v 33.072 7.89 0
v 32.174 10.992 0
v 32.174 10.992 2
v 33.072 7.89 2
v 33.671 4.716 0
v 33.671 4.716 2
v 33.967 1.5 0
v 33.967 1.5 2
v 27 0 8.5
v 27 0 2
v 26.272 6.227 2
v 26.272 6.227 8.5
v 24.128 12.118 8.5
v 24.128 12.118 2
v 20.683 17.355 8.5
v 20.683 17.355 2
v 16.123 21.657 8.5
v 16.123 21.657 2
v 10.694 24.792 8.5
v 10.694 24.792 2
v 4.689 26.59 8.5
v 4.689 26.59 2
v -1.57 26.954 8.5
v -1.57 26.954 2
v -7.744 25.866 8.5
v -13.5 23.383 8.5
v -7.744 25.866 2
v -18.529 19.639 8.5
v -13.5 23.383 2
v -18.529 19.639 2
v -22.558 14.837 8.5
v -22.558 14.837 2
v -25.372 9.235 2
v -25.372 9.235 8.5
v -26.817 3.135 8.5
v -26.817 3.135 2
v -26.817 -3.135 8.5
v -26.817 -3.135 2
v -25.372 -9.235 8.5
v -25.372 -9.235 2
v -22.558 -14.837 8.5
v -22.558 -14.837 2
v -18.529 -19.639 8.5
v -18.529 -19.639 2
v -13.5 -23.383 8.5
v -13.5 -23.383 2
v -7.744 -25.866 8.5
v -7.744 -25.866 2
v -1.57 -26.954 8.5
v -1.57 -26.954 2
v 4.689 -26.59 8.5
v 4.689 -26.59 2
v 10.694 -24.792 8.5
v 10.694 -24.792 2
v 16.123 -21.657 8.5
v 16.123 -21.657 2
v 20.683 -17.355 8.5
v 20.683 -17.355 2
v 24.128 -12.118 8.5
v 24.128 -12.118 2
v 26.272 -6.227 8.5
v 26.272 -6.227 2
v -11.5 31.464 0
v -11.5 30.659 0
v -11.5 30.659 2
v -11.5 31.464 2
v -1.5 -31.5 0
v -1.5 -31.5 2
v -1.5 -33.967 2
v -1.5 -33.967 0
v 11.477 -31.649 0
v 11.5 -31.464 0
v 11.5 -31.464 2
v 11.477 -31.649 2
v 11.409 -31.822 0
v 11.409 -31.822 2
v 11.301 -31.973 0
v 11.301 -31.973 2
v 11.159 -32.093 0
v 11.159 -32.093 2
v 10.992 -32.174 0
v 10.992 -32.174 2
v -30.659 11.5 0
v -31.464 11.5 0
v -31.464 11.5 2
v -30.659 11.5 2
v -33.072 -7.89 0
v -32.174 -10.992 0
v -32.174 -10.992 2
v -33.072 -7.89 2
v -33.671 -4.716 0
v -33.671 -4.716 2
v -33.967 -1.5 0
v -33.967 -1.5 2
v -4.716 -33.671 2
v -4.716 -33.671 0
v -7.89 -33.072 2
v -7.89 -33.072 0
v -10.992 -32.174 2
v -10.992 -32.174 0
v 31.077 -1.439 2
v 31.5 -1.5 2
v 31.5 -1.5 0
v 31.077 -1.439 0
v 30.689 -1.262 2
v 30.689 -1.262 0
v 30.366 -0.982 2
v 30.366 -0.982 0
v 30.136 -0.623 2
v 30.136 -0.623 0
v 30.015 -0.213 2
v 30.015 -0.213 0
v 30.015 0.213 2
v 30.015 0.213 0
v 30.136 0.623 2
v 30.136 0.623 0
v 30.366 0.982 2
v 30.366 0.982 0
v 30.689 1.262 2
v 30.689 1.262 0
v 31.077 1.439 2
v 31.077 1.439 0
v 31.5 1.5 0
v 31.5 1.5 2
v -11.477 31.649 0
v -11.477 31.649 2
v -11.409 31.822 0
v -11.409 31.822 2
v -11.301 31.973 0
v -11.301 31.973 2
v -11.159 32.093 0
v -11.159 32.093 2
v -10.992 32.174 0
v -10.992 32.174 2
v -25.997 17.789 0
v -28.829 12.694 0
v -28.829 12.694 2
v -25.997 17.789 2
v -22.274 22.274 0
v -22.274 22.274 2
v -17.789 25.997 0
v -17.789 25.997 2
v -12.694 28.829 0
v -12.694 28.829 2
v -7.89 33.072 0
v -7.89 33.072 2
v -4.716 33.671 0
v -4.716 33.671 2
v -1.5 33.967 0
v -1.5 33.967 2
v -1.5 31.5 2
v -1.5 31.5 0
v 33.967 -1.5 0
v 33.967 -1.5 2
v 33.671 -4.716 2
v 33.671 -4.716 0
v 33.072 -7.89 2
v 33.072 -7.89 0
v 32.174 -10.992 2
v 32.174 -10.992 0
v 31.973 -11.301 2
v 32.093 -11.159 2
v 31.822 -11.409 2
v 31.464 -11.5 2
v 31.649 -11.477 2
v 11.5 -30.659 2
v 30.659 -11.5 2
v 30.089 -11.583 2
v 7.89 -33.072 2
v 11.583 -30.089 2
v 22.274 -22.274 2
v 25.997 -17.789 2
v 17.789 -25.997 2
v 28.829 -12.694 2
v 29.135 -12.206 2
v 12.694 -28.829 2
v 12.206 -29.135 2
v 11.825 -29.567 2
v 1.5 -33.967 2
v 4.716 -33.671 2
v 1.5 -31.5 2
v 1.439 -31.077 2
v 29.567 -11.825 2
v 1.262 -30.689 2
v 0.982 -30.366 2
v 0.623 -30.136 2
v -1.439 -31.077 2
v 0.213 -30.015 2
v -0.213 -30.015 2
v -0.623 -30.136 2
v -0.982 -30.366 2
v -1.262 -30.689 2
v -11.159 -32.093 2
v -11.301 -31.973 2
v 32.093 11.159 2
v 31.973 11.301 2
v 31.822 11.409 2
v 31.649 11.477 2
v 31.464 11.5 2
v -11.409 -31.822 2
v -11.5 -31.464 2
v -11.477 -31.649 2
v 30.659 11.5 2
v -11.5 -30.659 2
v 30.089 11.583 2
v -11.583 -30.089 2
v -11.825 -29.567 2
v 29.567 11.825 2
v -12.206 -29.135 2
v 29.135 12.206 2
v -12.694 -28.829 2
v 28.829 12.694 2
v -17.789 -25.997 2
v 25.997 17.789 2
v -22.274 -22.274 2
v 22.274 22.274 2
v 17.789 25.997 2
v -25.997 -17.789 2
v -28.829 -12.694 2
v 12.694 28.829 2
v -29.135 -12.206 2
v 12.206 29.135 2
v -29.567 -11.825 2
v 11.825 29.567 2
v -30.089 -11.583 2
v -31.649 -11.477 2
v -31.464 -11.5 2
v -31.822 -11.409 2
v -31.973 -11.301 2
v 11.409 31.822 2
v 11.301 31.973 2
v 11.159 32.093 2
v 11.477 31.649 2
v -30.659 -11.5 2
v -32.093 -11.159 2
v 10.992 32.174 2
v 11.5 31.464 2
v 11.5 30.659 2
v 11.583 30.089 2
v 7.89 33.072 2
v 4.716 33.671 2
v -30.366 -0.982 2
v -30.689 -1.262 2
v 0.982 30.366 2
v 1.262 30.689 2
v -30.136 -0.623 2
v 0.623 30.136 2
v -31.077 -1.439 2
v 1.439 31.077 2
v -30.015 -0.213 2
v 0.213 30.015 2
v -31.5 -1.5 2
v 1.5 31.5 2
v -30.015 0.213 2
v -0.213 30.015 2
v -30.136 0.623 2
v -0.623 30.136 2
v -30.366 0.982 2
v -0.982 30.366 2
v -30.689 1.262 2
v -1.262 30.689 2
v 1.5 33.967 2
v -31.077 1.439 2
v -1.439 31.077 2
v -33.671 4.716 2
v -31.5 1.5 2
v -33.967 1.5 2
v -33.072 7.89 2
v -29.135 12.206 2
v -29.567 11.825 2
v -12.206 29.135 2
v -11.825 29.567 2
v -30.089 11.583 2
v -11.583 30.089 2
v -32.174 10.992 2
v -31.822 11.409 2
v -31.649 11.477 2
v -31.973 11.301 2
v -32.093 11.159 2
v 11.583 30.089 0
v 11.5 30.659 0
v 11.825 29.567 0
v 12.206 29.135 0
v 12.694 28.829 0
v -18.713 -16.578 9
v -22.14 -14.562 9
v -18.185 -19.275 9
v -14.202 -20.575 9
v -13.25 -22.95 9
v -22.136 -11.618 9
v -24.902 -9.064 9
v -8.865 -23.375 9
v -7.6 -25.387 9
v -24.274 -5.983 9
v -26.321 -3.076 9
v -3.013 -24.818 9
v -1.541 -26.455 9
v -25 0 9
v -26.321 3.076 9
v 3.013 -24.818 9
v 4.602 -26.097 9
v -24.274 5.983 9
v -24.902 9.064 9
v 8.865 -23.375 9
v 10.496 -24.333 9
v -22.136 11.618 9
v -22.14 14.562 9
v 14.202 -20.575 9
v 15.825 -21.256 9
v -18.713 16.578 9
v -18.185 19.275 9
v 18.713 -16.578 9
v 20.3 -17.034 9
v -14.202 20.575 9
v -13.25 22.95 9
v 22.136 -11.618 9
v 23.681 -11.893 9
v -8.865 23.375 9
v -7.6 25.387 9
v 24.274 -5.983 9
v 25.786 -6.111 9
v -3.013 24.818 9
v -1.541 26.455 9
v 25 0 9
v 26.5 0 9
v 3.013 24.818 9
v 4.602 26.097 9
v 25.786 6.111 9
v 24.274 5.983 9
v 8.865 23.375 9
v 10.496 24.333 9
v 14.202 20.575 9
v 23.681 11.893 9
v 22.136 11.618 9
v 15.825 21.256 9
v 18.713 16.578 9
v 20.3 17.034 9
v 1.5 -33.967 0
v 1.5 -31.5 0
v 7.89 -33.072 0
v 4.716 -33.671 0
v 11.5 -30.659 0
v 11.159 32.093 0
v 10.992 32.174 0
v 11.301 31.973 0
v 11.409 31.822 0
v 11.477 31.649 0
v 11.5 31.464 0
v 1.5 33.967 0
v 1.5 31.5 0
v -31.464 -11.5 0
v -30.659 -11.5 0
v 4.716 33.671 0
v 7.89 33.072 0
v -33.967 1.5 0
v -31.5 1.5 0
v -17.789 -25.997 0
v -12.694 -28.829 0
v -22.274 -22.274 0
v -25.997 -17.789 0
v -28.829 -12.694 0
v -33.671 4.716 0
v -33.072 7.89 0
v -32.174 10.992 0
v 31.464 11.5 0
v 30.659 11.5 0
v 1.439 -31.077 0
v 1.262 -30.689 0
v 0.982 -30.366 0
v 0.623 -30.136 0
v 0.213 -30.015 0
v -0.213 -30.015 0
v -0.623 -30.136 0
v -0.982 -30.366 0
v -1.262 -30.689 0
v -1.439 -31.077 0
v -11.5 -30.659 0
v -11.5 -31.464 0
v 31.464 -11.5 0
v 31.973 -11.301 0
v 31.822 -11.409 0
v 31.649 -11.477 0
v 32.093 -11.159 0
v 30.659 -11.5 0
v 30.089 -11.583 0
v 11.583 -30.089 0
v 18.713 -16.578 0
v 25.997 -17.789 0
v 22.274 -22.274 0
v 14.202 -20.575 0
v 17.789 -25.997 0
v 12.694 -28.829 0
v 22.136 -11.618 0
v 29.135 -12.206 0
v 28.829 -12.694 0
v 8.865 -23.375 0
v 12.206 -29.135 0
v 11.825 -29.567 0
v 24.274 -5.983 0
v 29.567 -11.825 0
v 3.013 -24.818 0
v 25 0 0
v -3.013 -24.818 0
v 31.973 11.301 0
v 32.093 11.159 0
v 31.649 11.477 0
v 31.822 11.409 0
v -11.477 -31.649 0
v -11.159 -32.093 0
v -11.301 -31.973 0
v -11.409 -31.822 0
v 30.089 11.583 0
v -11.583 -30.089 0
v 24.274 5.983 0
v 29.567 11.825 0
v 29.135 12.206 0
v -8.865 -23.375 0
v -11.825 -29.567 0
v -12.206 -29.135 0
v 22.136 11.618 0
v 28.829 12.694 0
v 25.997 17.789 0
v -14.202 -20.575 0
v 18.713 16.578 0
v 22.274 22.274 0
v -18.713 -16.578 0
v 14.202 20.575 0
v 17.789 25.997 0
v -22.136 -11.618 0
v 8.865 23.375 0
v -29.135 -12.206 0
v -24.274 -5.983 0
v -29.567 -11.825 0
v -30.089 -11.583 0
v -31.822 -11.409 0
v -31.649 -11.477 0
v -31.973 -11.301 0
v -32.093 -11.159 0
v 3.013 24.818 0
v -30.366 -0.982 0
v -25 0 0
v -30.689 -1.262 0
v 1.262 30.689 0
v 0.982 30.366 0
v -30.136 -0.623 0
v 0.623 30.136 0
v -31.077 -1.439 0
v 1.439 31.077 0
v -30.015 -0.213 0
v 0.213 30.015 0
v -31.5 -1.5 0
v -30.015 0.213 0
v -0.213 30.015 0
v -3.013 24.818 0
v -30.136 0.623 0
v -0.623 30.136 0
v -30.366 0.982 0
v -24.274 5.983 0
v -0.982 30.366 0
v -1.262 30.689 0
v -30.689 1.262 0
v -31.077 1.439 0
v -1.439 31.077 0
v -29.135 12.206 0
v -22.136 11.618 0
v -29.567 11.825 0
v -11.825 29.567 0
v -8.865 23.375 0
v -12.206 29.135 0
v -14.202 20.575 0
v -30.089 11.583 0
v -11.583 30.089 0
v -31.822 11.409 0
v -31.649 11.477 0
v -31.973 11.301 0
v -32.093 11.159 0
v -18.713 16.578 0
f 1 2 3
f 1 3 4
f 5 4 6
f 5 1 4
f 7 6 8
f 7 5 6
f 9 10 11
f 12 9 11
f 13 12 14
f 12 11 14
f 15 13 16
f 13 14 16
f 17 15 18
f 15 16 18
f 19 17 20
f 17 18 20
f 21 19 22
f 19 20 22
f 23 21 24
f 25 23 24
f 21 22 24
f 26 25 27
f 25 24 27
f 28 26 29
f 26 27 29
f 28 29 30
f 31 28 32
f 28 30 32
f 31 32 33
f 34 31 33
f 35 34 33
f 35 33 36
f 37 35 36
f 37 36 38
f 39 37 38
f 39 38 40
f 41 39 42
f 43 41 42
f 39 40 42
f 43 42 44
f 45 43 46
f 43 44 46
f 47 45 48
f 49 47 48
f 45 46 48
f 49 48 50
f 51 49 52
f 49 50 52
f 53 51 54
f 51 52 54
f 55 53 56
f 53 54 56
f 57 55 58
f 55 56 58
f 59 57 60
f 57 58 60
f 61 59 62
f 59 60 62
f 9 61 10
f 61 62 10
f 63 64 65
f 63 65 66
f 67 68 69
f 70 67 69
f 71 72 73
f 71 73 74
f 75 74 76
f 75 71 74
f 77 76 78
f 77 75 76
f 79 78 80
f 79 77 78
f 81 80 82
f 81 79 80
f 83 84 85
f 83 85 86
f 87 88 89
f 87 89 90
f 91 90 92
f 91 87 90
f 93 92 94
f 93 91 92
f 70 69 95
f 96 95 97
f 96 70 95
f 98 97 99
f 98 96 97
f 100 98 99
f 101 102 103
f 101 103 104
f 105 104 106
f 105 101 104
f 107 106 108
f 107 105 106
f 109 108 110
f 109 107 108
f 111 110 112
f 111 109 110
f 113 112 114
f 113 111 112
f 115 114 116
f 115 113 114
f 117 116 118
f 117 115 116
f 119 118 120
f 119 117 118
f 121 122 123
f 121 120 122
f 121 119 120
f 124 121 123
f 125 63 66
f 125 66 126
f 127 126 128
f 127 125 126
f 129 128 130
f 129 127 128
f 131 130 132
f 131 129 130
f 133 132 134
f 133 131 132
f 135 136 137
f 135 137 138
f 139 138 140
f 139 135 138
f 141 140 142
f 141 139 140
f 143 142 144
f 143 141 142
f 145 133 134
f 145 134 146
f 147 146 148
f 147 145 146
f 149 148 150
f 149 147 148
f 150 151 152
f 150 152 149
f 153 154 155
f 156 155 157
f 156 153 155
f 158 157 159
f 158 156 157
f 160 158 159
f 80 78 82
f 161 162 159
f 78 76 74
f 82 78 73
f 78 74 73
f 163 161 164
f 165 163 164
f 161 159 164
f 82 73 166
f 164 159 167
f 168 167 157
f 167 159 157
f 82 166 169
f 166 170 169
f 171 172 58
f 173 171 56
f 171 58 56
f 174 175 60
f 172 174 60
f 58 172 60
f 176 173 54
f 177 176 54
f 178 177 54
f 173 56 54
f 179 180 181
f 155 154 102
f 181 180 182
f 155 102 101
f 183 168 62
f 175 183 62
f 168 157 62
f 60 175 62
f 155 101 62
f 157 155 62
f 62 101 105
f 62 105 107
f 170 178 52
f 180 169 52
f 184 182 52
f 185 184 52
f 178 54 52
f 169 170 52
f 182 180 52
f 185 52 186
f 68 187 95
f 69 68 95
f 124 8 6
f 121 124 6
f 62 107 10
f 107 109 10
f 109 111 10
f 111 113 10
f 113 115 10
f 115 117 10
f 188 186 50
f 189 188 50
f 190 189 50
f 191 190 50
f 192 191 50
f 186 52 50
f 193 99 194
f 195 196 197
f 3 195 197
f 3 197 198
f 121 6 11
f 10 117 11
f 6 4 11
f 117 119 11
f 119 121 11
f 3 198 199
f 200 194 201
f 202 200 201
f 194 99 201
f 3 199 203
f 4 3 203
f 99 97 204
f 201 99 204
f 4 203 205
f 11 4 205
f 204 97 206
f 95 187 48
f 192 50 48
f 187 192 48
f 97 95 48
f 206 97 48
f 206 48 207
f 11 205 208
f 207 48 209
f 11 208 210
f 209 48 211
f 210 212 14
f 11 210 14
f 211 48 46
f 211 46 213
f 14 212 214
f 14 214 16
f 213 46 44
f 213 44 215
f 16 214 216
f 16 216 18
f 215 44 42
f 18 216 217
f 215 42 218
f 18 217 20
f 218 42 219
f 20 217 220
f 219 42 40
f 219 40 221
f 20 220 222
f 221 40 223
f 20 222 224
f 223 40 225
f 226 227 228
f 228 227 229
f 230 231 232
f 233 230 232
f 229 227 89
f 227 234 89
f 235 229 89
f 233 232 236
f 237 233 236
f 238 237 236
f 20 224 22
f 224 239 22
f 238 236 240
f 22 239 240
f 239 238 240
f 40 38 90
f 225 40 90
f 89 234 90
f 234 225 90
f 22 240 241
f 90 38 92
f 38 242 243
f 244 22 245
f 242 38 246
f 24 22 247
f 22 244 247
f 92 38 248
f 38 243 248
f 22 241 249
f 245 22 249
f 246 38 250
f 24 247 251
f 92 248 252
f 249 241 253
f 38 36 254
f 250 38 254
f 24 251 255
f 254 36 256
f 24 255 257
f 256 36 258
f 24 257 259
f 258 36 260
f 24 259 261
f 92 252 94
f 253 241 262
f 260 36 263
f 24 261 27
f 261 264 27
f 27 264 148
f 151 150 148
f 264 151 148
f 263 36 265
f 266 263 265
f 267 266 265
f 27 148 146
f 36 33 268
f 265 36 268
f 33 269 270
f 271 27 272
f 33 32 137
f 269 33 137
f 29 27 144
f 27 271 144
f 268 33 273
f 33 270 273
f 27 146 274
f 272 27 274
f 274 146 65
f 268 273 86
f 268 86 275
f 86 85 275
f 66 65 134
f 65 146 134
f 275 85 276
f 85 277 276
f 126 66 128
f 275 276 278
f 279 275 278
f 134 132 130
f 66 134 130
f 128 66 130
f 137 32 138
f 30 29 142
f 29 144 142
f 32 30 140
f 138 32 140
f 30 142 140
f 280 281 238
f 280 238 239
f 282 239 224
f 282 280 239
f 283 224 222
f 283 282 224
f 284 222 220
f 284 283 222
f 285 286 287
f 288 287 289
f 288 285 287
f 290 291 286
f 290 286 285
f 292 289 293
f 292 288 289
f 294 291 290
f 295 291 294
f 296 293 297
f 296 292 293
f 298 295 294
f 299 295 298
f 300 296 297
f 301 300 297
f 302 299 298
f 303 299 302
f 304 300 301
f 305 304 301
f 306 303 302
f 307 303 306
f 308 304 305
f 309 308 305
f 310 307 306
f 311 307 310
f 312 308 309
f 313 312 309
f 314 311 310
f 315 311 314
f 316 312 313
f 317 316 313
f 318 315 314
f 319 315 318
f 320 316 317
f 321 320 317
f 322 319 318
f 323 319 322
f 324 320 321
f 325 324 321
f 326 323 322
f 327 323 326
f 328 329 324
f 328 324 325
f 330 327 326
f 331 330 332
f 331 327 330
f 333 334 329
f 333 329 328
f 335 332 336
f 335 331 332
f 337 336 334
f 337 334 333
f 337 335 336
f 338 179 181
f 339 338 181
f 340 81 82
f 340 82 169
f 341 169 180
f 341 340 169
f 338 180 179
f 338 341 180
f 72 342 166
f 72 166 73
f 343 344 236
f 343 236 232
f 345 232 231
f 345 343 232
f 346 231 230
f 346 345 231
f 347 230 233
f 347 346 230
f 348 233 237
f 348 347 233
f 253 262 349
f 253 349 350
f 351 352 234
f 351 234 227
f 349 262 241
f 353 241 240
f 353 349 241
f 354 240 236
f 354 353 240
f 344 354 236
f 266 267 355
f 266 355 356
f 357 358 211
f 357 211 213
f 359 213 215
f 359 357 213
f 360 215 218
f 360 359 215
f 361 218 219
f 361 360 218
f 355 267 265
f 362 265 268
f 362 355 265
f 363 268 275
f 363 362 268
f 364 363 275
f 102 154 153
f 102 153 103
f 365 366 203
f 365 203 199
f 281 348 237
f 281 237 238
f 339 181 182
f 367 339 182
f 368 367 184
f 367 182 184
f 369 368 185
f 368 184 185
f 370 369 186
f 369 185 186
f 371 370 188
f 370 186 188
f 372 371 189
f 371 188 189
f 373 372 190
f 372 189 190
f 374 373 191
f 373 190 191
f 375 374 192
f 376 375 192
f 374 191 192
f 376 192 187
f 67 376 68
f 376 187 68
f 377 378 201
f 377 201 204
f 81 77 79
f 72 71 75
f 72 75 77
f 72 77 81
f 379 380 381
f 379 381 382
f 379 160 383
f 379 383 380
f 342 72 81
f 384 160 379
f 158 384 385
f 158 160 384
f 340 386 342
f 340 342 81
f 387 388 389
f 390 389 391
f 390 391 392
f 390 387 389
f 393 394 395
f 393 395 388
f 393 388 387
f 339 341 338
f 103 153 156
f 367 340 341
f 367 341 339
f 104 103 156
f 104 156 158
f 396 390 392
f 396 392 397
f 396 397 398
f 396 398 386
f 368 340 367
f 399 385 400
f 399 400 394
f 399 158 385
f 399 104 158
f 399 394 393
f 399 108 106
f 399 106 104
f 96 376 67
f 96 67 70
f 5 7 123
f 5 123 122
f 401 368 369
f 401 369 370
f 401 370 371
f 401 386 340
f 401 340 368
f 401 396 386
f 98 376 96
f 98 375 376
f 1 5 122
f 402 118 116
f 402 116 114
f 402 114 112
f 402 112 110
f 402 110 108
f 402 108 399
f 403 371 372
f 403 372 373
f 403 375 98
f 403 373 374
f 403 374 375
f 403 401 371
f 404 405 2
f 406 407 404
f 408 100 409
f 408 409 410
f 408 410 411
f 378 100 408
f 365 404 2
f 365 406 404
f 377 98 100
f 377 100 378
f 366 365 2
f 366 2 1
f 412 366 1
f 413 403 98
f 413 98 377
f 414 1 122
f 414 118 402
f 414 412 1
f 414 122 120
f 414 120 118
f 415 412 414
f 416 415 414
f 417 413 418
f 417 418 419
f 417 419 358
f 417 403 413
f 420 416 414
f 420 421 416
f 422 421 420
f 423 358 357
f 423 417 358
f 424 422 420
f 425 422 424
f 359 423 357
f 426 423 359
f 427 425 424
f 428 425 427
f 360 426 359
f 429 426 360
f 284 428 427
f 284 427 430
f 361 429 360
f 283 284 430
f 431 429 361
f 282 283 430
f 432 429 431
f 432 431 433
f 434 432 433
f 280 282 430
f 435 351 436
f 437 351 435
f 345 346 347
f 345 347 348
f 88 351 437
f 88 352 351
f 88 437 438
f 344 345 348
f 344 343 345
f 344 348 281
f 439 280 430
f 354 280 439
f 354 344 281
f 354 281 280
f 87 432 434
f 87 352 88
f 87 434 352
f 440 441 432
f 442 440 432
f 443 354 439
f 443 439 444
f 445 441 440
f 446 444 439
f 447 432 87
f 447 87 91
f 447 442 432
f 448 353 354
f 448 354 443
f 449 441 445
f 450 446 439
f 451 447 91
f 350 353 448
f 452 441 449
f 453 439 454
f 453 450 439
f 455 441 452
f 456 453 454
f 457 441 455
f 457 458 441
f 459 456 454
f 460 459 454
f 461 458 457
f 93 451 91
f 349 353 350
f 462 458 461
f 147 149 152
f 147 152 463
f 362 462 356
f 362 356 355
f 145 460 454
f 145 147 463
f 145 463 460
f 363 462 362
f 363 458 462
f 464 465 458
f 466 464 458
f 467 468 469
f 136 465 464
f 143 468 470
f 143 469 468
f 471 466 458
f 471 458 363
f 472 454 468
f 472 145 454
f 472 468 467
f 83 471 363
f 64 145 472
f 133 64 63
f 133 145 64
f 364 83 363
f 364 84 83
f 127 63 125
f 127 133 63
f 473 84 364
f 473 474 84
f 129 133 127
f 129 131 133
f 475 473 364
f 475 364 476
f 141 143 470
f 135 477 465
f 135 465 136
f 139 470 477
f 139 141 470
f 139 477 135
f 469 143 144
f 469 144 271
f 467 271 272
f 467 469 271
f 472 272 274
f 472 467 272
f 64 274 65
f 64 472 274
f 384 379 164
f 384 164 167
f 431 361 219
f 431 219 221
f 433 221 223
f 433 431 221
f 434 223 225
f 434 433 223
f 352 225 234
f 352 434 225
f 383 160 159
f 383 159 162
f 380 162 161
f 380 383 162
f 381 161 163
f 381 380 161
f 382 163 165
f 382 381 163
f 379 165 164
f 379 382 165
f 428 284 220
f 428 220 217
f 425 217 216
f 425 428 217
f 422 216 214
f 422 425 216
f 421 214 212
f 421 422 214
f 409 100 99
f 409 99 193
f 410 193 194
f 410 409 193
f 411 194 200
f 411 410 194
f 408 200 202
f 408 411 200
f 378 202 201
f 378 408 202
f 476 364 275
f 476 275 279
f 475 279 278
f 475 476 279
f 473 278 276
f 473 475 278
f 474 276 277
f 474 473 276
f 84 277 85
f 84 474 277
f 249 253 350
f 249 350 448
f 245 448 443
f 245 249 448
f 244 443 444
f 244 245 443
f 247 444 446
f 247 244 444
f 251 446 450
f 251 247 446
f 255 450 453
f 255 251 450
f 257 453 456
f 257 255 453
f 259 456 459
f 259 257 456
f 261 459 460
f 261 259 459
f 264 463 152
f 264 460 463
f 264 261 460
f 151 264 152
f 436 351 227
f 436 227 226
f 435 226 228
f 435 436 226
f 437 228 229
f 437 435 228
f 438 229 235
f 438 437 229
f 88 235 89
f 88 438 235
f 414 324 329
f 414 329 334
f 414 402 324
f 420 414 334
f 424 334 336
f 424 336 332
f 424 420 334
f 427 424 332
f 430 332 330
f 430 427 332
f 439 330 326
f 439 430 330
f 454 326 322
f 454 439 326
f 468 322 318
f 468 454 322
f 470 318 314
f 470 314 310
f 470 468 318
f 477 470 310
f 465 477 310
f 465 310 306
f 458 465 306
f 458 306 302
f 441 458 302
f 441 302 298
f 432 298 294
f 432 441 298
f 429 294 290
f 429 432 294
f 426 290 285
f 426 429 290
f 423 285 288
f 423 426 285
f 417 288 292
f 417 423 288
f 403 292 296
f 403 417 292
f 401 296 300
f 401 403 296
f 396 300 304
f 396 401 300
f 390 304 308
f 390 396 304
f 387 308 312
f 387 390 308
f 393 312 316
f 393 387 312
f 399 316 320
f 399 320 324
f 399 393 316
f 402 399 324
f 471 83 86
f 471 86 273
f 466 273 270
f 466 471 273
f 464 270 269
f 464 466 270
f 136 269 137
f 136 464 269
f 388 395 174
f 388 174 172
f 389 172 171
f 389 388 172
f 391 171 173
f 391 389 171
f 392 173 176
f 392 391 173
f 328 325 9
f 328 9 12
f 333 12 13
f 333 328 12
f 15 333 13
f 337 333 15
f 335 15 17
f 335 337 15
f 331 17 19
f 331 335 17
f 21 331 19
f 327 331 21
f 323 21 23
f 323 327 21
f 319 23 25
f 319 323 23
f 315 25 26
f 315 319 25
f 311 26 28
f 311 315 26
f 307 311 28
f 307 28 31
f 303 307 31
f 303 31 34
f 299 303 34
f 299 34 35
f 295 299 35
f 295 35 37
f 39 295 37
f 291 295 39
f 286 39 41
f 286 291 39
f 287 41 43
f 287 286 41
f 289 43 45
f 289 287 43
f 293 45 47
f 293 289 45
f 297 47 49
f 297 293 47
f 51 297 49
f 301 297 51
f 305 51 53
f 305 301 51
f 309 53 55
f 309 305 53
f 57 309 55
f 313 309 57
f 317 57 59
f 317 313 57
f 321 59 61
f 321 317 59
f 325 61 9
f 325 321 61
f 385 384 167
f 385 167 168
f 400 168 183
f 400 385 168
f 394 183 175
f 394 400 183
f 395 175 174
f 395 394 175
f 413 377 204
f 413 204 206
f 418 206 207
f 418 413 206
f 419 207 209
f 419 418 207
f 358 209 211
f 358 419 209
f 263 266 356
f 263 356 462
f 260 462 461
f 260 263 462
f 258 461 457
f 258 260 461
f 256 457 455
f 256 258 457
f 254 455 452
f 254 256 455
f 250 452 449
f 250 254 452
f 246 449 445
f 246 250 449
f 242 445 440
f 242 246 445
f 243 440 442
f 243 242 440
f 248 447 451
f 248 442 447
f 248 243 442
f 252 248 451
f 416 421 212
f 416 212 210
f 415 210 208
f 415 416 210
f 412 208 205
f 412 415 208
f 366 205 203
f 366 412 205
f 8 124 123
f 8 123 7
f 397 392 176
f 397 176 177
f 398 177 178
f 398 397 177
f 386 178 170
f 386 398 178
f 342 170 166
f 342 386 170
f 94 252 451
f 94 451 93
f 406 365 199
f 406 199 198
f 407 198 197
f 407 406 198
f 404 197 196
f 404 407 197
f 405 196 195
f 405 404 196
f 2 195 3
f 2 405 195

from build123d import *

# Parameters (mm, degrees)
SKETCH1_R           = 25
BOSS_EXTRUDE1_DEPTH = 2
SKETCH2_R           = 27
SKETCH2_R_2         = 25
BOSS_EXTRUDE2_DEPTH = 7
CUT_EXTRUDE1_DEPTH  = 49.590122453
CHAMFER1_SIZE       = 0.5


with BuildPart() as part:
    # Sketch1 → Boss-Extrude1 (new body)
    with BuildSketch(Plane.XY):
        with BuildLine():
            Line((-11.5, 30.659419425), (-11.5, 31.464265445))
            ThreePointArc((-11.5, 31.464265445), (-11.36006594, 31.900521733), (-10.992481203, 32.173985718))
            ThreePointArc((-10.992481203, 32.173985718), (0, 34), (10.992481203, 32.173985718))
            ThreePointArc((10.992481203, 32.173985718), (11.36006594, 31.900521733), (11.5, 31.464265445))
            Line((11.5, 31.464265445), (11.5, 30.659419425))
            ThreePointArc((11.5, 30.659419425), (11.824896973, 29.566702695), (12.694029851, 28.829006324))
            ThreePointArc((12.694029851, 28.829006324), (22.273863602, 22.273863602), (28.829006324, 12.694029851))
            ThreePointArc((28.829006324, 12.694029851), (29.566702695, 11.824896973), (30.659419425, 11.5))
            Line((30.659419425, 11.5), (31.464265445, 11.5))
            ThreePointArc((31.464265445, 11.5), (31.900521733, 11.36006594), (32.173985718, 10.992481203))
            ThreePointArc((32.173985718, 10.992481203), (34, 0), (32.173985718, -10.992481203))
            ThreePointArc((32.173985718, -10.992481203), (31.900521733, -11.36006594), (31.464265445, -11.5))
            Line((31.464265445, -11.5), (30.659419425, -11.5))
            ThreePointArc((30.659419425, -11.5), (29.566702695, -11.824896973), (28.829006324, -12.694029851))
            ThreePointArc((28.829006324, -12.694029851), (22.273863602, -22.273863602), (12.694029851, -28.829006324))
            ThreePointArc((12.694029851, -28.829006324), (11.824896973, -29.566702695), (11.5, -30.659419425))
            Line((11.5, -30.659419425), (11.5, -31.464265445))
            ThreePointArc((11.5, -31.464265445), (11.36006594, -31.900521733), (10.992481203, -32.173985718))
            ThreePointArc((10.992481203, -32.173985718), (0, -34), (-10.992481203, -32.173985718))
            ThreePointArc((-10.992481203, -32.173985718), (-11.36006594, -31.900521733), (-11.5, -31.464265445))
            Line((-11.5, -31.464265445), (-11.5, -30.659419425))
            ThreePointArc((-11.5, -30.659419425), (-11.824896973, -29.566702695), (-12.694029851, -28.829006324))
            ThreePointArc((-12.694029851, -28.829006324), (-22.273863602, -22.273863602), (-28.829006324, -12.694029851))
            ThreePointArc((-28.829006324, -12.694029851), (-29.566702695, -11.824896973), (-30.659419425, -11.5))
            Line((-30.659419425, -11.5), (-31.464265445, -11.5))
            ThreePointArc((-31.464265445, -11.5), (-31.900521733, -11.36006594), (-32.173985718, -10.992481203))
            ThreePointArc((-32.173985718, -10.992481203), (-34, 0), (-32.173985718, 10.992481203))
            ThreePointArc((-32.173985718, 10.992481203), (-31.900521733, 11.36006594), (-31.464265445, 11.5))
            Line((-31.464265445, 11.5), (-30.659419425, 11.5))
            ThreePointArc((-30.659419425, 11.5), (-29.566702695, 11.824896973), (-28.829006324, 12.694029851))
            ThreePointArc((-28.829006324, 12.694029851), (-22.273863602, 22.273863602), (-12.694029851, 28.829006324))
            ThreePointArc((-12.694029851, 28.829006324), (-11.824896973, 29.566702695), (-11.5, 30.659419425))
        make_face()
        Circle(SKETCH1_R, mode=Mode.SUBTRACT)
    extrude(amount=BOSS_EXTRUDE1_DEPTH)

    # Sketch2 → Boss-Extrude2 (add)
    with BuildSketch(Plane.XY.offset(2)):
        Circle(SKETCH2_R)
        Circle(SKETCH2_R_2, mode=Mode.SUBTRACT)
    extrude(amount=BOSS_EXTRUDE2_DEPTH)

    # Sketch3 → Cut-Extrude1 (cut, through all)
    with BuildSketch(Plane.XY.offset(2)):
        with BuildLine():
            Line((31.5, 1.5), (35.327471806, 1.5))
            Line((35.327471806, 1.5), (35.327471806, -1.5))
            Line((35.327471806, -1.5), (31.5, -1.5))
            ThreePointArc((31.5, -1.5), (30, 0), (31.5, 1.5))
        make_face()
        with BuildLine():
            Line((-1.5, -31.5), (-1.5, -34.385950358))
            Line((-1.5, -34.385950358), (1.5, -34.385950358))
            Line((1.5, -34.385950358), (1.5, -31.5))
            ThreePointArc((1.5, -31.5), (0, -30), (-1.5, -31.5))
        make_face()
        with BuildLine():
            Line((-31.5, -1.5), (-36.640801576, -1.5))
            Line((-36.640801576, -1.5), (-36.640801576, 1.5))
            Line((-36.640801576, 1.5), (-31.5, 1.5))
            ThreePointArc((-31.5, 1.5), (-30, 0), (-31.5, -1.5))
        make_face()
        with BuildLine():
            Line((-1.5, 31.5), (-1.5, 35.301296781))
            Line((-1.5, 35.301296781), (1.5, 35.301296781))
            Line((1.5, 35.301296781), (1.5, 31.5))
            ThreePointArc((1.5, 31.5), (0, 30), (-1.5, 31.5))
        make_face()
    extrude(amount=-CUT_EXTRUDE1_DEPTH, mode=Mode.SUBTRACT)

    # Chamfer1
    chamfer1_edges = [part.edges().sort_by_distance(p)[0] for p in [
        (-27, 0, 9),
    ]]
    chamfer(chamfer1_edges, length=CHAMFER1_SIZE)


solid = part.part
